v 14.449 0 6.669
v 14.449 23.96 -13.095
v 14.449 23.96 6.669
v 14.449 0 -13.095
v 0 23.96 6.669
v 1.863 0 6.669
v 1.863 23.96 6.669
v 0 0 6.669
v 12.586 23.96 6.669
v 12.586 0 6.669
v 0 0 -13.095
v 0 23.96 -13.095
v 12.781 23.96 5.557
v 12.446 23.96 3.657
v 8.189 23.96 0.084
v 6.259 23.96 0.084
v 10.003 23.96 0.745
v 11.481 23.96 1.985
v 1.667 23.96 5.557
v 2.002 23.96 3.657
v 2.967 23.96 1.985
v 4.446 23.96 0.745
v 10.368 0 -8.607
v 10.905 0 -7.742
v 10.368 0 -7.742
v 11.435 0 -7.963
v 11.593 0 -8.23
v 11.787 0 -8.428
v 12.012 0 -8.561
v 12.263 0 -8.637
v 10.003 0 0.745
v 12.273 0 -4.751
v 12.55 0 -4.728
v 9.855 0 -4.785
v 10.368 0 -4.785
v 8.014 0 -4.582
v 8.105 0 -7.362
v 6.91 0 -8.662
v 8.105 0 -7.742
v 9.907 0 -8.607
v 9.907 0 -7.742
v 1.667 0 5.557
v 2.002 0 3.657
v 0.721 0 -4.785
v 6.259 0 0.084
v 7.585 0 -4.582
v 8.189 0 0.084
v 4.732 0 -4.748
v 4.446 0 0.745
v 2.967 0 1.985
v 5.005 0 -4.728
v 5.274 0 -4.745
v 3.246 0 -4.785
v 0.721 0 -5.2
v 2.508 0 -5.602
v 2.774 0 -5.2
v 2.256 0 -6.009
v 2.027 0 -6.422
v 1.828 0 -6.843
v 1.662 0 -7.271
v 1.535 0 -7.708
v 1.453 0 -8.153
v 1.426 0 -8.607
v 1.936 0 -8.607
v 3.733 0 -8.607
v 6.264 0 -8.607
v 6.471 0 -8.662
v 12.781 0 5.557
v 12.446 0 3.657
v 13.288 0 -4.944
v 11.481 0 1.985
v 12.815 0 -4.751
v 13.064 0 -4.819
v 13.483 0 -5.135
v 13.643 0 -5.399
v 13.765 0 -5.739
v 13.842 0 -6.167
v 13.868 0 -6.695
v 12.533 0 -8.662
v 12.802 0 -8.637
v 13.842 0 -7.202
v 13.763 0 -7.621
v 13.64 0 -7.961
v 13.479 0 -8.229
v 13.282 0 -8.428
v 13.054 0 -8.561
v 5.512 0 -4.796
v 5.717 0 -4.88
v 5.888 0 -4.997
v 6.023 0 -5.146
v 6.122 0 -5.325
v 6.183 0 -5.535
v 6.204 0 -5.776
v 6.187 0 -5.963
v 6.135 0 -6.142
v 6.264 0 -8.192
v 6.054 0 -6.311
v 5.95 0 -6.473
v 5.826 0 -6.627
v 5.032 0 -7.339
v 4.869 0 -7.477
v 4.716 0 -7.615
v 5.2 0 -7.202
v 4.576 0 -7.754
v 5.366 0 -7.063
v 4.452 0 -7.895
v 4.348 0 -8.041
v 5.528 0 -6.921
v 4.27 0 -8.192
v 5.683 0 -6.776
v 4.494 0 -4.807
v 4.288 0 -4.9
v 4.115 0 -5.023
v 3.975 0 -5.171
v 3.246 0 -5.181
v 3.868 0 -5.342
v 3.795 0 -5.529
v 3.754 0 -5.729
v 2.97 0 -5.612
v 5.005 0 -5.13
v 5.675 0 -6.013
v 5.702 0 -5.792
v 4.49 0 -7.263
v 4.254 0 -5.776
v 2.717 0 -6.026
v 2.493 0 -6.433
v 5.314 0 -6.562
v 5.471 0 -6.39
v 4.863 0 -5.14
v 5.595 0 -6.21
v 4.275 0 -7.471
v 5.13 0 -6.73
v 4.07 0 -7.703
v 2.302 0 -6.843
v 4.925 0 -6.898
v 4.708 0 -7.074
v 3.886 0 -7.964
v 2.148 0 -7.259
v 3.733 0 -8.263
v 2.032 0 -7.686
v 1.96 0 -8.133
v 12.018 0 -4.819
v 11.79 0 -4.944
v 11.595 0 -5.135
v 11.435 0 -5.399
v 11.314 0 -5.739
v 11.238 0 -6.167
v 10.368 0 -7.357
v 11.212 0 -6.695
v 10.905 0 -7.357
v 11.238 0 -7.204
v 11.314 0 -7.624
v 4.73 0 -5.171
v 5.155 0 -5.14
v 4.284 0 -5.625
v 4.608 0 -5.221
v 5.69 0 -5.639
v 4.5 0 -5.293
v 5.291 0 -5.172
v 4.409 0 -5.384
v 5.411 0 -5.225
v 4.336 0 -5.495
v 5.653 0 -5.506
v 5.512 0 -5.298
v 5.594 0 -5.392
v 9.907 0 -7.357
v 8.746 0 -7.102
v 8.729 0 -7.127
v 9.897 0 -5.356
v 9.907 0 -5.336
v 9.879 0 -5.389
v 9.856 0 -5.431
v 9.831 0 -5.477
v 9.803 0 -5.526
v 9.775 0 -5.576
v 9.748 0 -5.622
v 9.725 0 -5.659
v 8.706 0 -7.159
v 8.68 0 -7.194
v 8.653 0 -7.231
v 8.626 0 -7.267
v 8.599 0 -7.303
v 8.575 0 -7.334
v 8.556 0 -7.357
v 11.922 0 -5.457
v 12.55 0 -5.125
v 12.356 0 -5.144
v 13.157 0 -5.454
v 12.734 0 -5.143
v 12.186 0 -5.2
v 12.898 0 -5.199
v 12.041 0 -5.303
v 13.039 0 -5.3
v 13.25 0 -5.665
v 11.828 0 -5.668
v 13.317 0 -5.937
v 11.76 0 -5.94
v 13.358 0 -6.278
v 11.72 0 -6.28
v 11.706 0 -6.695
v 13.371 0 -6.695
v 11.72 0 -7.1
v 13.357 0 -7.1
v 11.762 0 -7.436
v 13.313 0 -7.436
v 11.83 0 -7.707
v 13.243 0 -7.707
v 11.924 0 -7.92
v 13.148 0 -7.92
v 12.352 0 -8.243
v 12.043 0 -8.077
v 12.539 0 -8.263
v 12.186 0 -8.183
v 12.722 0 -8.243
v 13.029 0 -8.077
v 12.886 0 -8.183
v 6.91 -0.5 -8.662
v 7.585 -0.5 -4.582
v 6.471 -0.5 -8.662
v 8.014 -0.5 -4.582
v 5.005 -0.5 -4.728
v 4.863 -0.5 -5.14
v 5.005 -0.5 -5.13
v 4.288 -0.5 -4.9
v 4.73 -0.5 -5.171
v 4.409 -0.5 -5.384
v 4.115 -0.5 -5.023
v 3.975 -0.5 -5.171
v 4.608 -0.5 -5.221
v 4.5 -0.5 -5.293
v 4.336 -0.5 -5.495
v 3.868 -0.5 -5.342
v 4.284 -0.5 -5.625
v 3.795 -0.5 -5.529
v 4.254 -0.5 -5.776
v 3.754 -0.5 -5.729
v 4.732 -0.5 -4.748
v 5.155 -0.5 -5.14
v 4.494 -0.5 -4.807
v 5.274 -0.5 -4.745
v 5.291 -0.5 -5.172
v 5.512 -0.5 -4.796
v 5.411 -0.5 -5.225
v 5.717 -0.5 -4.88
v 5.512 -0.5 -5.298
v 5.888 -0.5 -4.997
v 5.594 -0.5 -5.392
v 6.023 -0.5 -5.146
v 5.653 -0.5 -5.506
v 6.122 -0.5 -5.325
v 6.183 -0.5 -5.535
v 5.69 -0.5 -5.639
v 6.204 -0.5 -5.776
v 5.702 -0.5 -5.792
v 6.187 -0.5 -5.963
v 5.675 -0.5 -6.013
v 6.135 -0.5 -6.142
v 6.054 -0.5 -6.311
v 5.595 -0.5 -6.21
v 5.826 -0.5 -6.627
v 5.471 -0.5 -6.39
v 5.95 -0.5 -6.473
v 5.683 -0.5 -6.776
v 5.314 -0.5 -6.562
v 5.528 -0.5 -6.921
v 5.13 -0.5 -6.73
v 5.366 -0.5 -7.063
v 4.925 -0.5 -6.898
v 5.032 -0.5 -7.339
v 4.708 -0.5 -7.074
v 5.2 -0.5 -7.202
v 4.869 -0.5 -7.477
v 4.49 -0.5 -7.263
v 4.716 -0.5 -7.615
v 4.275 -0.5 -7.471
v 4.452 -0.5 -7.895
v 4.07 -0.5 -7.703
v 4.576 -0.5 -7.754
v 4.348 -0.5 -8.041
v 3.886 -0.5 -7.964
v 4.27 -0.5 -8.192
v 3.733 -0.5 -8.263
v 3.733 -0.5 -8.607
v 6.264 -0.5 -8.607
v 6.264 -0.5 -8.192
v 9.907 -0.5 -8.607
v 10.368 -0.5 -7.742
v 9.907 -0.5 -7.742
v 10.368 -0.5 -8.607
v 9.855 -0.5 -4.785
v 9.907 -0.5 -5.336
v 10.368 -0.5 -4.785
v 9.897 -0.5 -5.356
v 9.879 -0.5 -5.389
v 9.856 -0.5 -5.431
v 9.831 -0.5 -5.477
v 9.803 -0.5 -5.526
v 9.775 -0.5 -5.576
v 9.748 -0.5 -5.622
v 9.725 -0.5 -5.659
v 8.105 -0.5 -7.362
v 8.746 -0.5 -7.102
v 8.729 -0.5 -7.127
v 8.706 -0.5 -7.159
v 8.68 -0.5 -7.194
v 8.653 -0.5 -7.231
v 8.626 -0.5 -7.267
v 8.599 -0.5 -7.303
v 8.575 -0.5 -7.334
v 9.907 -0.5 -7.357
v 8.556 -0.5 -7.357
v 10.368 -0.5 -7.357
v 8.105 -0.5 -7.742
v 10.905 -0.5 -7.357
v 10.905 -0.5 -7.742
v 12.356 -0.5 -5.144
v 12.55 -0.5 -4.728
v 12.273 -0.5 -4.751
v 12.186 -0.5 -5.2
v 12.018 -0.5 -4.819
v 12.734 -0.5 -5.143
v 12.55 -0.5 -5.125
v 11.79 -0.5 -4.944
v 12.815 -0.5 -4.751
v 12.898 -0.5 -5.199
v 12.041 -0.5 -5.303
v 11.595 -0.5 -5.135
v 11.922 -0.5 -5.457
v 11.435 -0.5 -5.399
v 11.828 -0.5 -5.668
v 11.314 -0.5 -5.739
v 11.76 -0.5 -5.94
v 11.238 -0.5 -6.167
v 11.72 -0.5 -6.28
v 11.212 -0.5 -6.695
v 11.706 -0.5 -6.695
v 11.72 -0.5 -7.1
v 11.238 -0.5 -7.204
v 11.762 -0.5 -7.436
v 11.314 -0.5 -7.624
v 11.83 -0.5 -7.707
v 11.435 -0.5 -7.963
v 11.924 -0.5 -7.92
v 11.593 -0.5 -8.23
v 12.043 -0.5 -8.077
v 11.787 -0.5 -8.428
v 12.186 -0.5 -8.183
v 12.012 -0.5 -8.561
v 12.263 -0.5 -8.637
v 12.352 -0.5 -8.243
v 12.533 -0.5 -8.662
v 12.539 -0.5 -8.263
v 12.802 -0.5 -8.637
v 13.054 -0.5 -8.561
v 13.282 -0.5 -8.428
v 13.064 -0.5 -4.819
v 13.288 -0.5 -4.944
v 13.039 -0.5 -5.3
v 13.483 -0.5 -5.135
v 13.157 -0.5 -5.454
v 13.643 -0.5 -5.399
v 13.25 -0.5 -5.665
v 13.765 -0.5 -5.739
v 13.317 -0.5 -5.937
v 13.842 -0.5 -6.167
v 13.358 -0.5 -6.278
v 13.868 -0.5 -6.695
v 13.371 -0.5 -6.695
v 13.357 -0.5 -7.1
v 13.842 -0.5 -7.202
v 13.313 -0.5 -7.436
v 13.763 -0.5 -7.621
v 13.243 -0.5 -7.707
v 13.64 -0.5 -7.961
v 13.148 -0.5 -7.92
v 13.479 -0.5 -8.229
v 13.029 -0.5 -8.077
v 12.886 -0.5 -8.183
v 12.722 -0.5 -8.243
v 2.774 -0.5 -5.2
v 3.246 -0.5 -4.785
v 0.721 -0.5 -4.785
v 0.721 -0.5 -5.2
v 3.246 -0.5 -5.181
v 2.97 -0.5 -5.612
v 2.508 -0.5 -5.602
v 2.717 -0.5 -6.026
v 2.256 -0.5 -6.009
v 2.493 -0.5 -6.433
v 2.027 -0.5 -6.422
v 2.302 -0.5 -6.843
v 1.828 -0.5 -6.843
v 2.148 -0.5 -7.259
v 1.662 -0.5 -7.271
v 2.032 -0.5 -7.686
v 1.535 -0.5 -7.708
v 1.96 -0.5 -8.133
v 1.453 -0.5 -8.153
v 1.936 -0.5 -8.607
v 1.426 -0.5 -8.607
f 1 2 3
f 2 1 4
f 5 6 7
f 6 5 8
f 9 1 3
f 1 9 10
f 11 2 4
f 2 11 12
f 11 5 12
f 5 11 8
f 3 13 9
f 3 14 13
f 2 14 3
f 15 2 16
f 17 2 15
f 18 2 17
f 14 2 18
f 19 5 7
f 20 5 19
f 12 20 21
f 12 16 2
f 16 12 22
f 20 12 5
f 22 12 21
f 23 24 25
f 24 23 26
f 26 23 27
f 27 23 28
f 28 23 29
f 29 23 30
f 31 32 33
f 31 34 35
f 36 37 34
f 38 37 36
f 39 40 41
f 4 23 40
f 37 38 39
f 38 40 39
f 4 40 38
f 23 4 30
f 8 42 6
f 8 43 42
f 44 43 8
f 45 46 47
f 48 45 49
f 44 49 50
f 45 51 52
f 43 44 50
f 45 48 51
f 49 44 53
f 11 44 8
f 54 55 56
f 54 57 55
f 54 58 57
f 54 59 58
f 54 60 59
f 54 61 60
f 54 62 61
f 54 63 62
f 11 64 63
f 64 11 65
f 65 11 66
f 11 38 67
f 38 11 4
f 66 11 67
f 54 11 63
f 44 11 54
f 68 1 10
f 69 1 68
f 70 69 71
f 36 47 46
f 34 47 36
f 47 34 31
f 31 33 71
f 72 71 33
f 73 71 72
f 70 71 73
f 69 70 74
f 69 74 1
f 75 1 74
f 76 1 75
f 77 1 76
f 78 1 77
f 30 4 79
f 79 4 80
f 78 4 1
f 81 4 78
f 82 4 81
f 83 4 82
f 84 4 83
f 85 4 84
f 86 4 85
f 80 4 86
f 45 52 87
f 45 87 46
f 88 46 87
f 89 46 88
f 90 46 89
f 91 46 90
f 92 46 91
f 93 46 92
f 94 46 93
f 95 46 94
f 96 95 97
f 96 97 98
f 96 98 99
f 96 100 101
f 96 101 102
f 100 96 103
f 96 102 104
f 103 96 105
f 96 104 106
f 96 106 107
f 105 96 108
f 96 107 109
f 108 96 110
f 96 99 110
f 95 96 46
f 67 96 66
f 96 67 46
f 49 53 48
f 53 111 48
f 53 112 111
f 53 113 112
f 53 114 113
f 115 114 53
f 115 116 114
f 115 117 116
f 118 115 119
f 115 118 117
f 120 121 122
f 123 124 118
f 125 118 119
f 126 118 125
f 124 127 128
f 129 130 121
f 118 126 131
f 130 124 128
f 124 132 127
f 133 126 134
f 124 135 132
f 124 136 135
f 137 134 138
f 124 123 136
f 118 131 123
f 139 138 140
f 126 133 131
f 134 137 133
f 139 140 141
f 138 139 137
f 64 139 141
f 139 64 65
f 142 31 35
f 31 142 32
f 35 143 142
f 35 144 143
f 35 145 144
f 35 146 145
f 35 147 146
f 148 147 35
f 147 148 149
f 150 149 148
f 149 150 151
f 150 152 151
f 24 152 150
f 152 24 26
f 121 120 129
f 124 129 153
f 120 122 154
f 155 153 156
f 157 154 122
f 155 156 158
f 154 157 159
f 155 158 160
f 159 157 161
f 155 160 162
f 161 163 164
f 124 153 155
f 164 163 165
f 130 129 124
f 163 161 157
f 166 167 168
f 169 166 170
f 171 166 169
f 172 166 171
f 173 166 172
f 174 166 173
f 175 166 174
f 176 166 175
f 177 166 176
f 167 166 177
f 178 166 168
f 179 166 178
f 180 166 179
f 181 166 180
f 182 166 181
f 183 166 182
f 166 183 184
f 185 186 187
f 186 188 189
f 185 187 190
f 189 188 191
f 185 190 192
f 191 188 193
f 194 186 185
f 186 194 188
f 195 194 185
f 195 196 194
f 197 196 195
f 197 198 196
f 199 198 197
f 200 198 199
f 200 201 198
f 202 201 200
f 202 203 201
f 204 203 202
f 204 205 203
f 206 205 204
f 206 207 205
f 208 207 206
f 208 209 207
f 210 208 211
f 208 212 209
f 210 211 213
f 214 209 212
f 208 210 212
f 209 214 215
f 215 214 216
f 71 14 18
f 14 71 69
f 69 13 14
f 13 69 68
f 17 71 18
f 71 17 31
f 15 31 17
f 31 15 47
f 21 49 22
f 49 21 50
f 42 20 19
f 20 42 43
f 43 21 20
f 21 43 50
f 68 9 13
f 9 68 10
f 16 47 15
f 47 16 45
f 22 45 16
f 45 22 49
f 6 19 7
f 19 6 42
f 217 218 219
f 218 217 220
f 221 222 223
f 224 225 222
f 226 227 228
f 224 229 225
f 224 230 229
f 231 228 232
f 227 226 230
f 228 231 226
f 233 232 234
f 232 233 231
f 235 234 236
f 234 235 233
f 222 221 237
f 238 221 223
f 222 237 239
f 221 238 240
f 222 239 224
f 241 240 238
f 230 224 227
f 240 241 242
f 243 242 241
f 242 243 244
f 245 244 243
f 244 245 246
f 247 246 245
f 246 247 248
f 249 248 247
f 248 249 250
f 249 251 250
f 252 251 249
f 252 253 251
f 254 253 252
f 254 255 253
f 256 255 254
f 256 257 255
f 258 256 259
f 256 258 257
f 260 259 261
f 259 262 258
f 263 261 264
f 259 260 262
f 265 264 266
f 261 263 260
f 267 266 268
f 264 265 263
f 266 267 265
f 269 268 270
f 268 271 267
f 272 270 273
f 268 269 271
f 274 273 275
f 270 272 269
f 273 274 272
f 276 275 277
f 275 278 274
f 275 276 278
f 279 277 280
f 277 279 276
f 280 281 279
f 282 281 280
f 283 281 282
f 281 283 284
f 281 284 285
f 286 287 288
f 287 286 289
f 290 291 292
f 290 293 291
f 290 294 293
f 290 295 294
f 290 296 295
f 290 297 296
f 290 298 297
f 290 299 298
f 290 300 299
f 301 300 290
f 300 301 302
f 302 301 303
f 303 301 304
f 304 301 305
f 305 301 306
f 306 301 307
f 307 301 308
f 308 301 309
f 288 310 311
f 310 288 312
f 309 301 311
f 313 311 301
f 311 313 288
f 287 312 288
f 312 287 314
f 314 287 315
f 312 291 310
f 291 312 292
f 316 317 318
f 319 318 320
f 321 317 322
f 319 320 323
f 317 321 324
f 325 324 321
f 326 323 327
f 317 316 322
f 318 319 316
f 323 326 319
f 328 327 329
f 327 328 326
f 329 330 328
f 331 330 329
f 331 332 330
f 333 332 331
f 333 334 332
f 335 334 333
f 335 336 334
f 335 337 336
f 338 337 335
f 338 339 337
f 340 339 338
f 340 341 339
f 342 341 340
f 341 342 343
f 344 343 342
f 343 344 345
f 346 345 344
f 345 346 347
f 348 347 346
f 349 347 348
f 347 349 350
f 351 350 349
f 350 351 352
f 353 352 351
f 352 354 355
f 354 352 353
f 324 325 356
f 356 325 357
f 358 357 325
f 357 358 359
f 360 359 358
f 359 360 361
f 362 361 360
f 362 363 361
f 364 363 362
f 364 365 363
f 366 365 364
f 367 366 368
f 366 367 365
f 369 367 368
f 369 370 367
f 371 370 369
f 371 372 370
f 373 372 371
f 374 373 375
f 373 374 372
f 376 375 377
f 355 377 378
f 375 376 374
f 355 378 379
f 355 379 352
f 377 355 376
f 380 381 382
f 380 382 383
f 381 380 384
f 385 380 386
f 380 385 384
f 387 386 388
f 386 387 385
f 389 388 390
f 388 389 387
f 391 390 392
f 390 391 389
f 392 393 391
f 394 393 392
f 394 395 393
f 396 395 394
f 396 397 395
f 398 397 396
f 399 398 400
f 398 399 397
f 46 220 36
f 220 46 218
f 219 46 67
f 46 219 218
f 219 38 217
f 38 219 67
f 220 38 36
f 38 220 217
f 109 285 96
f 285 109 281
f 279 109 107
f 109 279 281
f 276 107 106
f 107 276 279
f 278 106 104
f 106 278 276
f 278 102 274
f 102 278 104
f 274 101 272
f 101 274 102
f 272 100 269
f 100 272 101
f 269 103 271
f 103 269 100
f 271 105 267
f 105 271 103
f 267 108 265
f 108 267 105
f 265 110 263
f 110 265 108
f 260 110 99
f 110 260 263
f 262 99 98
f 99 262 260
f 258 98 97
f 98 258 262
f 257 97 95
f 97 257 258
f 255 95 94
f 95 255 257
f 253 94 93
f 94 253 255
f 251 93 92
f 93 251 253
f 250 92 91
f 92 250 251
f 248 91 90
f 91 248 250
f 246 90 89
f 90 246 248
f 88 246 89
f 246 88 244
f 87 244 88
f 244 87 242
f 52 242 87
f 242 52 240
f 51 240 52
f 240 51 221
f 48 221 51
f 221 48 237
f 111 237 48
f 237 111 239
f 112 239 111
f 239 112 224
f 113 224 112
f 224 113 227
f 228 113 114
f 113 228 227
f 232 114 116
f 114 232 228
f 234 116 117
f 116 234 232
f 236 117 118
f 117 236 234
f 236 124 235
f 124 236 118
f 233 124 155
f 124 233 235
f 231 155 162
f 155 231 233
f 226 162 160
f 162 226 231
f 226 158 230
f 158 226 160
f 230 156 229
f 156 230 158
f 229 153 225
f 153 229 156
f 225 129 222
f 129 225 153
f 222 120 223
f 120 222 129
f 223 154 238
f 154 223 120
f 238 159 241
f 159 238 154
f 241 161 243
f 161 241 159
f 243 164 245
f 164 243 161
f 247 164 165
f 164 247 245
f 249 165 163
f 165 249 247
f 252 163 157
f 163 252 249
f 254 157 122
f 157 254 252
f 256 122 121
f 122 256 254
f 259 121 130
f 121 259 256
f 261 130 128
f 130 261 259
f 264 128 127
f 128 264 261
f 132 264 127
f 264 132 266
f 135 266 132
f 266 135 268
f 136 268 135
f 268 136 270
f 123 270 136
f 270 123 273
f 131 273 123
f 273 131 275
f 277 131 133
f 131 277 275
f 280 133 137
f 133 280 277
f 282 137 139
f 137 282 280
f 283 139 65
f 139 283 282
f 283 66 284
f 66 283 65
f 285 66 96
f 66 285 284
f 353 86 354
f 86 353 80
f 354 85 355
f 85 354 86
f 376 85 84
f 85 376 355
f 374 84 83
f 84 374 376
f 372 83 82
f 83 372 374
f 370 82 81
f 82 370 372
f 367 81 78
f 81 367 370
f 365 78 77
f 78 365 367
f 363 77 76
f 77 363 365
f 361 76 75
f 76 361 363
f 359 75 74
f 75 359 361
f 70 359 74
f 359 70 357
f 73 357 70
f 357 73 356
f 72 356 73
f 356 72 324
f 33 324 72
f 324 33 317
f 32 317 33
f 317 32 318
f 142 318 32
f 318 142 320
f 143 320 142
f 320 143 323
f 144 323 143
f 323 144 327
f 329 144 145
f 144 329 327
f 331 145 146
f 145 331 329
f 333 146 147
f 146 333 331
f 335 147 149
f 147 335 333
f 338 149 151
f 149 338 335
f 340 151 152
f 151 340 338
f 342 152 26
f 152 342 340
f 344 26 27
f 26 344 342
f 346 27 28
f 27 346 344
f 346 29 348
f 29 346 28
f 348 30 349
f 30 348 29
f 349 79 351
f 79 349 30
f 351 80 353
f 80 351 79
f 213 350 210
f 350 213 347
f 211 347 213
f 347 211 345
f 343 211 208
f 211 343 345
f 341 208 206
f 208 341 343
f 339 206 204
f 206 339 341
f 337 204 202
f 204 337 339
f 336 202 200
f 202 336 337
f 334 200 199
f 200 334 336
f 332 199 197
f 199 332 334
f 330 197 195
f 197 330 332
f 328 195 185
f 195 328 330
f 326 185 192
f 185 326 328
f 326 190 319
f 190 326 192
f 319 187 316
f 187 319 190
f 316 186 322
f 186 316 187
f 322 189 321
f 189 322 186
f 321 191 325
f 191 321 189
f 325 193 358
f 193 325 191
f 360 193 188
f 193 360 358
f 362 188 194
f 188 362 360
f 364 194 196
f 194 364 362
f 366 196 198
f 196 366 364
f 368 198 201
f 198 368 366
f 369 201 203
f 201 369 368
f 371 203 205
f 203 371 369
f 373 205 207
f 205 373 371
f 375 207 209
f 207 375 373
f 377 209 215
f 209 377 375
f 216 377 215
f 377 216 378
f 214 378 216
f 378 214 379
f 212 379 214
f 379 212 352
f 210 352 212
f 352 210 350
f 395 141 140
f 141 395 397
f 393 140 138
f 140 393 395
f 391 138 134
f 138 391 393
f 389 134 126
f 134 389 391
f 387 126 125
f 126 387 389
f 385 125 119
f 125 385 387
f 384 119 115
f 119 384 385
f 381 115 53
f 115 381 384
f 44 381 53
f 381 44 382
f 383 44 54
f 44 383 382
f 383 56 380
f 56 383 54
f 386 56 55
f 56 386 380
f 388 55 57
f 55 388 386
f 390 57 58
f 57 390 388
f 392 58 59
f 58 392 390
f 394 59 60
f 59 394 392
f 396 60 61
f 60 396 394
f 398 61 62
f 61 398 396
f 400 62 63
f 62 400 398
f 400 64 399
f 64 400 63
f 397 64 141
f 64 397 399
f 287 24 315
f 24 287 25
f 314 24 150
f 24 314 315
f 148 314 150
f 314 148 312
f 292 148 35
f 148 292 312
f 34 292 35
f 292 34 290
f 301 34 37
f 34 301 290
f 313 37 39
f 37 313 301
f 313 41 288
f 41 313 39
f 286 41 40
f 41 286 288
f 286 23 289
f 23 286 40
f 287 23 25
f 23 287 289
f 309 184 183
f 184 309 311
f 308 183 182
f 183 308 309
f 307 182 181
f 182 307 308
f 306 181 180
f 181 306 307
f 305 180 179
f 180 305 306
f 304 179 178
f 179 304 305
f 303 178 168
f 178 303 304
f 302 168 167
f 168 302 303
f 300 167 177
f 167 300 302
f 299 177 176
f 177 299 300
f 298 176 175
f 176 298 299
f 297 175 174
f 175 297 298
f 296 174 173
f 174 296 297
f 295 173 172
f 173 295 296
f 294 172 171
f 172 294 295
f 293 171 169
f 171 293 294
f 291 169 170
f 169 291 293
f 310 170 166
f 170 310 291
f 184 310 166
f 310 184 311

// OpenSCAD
// file: utils.scad
// Computes the number of fragments for a circle of radius r.
// For all r' > r, fragments_num(r') >= fragments_num(r).
// For all values, fragments_num > 3.
function fragments_num(r, fn, fs, fa) =
    let (
        fa_num = ceil(360 / fa),
        fs_num = ceil(r * 2 * PI / fs)
    )
    (fn > 0) ? max(fn, 3)
             : max(min(fa_num, fs_num), 5);

// Finds the radius to specify for a circle that has a minimum radius of r.
function find_outer_radius(r, fn=$fn, fs=$fs, fa=$fa) =
    let (
        fragments = fragments_num(r, fn, fs, fa),
        // fragments > 3 => cos(360 / fragments / 2) <= 1
        // => candidate_or >= r
        candidate_or = r / cos(360 / fragments / 2),
        // candidate_or >= r => candidate_fragments >= fragments
        candidate_fragments = fragments_num(candidate_or, fn, fs, fa),
        // candidate_fragments >= fragments => candidate_ir >= r
        candidate_ir = candidate_or * cos(360 / candidate_fragments / 2)
    )
    (candidate_ir >= r) ? candidate_or
    : assert(candidate_ir >= r);
// main file
use <utils.scad>;

// dimensions are in mm
epsilon = 0.1;
side_clearance = 1;
cylinder_diameter = 9.92;
cylinder_length = 23.96;
groove = 1.98;

cylinder_cutout_diameter = 2 * find_outer_radius(cylinder_diameter / 2) + side_clearance;

key_handle_width = 24.3;
key_blade_width = 8.11;
key_overhang = (key_handle_width - key_blade_width) / 2;
key_thickness = 2.2;
key_handle_length = 21.7;
key_blade_length = 31.8;

bottom_standoff = key_overhang + 5;
block_length = cylinder_length;
block_width = cylinder_cutout_diameter * 1.3;
block_height = cylinder_cutout_diameter * 0.6 + bottom_standoff; 

echo(bottom_standoff);

module cylinder_cutout() {
    translate([block_width / 2, -epsilon/2, cylinder_cutout_diameter/2])
    rotate([-90, 0, 0])
    cylinder(h = cylinder_length + epsilon, d = cylinder_cutout_diameter);
}

module cylinder_holder() {
    difference() {
        translate([0, 0, -bottom_standoff])
        cube([block_width, block_length, block_height]);

        cylinder_cutout();
    }
}

text_thickness = 0.5;

module label() {
    translate([block_width/2, epsilon, -cylinder_cutout_diameter * 0.6])
    rotate([90, 0, 0])
    linear_extrude(text_thickness + epsilon)
    text("72/40", size = 4, halign = "center", valign = "center");
}

union() {
cylinder_holder();
label();
}

module key() {

    union() {
        translate([(block_width - key_thickness) / 2, 0, 0])
        cube([key_thickness, key_blade_length, key_blade_width]);
        
        translate([(block_width - key_thickness) / 2, key_blade_length - epsilon, -key_overhang])
        cube([key_thickness, key_handle_length + epsilon, key_handle_width]);
    }
}

// key();
